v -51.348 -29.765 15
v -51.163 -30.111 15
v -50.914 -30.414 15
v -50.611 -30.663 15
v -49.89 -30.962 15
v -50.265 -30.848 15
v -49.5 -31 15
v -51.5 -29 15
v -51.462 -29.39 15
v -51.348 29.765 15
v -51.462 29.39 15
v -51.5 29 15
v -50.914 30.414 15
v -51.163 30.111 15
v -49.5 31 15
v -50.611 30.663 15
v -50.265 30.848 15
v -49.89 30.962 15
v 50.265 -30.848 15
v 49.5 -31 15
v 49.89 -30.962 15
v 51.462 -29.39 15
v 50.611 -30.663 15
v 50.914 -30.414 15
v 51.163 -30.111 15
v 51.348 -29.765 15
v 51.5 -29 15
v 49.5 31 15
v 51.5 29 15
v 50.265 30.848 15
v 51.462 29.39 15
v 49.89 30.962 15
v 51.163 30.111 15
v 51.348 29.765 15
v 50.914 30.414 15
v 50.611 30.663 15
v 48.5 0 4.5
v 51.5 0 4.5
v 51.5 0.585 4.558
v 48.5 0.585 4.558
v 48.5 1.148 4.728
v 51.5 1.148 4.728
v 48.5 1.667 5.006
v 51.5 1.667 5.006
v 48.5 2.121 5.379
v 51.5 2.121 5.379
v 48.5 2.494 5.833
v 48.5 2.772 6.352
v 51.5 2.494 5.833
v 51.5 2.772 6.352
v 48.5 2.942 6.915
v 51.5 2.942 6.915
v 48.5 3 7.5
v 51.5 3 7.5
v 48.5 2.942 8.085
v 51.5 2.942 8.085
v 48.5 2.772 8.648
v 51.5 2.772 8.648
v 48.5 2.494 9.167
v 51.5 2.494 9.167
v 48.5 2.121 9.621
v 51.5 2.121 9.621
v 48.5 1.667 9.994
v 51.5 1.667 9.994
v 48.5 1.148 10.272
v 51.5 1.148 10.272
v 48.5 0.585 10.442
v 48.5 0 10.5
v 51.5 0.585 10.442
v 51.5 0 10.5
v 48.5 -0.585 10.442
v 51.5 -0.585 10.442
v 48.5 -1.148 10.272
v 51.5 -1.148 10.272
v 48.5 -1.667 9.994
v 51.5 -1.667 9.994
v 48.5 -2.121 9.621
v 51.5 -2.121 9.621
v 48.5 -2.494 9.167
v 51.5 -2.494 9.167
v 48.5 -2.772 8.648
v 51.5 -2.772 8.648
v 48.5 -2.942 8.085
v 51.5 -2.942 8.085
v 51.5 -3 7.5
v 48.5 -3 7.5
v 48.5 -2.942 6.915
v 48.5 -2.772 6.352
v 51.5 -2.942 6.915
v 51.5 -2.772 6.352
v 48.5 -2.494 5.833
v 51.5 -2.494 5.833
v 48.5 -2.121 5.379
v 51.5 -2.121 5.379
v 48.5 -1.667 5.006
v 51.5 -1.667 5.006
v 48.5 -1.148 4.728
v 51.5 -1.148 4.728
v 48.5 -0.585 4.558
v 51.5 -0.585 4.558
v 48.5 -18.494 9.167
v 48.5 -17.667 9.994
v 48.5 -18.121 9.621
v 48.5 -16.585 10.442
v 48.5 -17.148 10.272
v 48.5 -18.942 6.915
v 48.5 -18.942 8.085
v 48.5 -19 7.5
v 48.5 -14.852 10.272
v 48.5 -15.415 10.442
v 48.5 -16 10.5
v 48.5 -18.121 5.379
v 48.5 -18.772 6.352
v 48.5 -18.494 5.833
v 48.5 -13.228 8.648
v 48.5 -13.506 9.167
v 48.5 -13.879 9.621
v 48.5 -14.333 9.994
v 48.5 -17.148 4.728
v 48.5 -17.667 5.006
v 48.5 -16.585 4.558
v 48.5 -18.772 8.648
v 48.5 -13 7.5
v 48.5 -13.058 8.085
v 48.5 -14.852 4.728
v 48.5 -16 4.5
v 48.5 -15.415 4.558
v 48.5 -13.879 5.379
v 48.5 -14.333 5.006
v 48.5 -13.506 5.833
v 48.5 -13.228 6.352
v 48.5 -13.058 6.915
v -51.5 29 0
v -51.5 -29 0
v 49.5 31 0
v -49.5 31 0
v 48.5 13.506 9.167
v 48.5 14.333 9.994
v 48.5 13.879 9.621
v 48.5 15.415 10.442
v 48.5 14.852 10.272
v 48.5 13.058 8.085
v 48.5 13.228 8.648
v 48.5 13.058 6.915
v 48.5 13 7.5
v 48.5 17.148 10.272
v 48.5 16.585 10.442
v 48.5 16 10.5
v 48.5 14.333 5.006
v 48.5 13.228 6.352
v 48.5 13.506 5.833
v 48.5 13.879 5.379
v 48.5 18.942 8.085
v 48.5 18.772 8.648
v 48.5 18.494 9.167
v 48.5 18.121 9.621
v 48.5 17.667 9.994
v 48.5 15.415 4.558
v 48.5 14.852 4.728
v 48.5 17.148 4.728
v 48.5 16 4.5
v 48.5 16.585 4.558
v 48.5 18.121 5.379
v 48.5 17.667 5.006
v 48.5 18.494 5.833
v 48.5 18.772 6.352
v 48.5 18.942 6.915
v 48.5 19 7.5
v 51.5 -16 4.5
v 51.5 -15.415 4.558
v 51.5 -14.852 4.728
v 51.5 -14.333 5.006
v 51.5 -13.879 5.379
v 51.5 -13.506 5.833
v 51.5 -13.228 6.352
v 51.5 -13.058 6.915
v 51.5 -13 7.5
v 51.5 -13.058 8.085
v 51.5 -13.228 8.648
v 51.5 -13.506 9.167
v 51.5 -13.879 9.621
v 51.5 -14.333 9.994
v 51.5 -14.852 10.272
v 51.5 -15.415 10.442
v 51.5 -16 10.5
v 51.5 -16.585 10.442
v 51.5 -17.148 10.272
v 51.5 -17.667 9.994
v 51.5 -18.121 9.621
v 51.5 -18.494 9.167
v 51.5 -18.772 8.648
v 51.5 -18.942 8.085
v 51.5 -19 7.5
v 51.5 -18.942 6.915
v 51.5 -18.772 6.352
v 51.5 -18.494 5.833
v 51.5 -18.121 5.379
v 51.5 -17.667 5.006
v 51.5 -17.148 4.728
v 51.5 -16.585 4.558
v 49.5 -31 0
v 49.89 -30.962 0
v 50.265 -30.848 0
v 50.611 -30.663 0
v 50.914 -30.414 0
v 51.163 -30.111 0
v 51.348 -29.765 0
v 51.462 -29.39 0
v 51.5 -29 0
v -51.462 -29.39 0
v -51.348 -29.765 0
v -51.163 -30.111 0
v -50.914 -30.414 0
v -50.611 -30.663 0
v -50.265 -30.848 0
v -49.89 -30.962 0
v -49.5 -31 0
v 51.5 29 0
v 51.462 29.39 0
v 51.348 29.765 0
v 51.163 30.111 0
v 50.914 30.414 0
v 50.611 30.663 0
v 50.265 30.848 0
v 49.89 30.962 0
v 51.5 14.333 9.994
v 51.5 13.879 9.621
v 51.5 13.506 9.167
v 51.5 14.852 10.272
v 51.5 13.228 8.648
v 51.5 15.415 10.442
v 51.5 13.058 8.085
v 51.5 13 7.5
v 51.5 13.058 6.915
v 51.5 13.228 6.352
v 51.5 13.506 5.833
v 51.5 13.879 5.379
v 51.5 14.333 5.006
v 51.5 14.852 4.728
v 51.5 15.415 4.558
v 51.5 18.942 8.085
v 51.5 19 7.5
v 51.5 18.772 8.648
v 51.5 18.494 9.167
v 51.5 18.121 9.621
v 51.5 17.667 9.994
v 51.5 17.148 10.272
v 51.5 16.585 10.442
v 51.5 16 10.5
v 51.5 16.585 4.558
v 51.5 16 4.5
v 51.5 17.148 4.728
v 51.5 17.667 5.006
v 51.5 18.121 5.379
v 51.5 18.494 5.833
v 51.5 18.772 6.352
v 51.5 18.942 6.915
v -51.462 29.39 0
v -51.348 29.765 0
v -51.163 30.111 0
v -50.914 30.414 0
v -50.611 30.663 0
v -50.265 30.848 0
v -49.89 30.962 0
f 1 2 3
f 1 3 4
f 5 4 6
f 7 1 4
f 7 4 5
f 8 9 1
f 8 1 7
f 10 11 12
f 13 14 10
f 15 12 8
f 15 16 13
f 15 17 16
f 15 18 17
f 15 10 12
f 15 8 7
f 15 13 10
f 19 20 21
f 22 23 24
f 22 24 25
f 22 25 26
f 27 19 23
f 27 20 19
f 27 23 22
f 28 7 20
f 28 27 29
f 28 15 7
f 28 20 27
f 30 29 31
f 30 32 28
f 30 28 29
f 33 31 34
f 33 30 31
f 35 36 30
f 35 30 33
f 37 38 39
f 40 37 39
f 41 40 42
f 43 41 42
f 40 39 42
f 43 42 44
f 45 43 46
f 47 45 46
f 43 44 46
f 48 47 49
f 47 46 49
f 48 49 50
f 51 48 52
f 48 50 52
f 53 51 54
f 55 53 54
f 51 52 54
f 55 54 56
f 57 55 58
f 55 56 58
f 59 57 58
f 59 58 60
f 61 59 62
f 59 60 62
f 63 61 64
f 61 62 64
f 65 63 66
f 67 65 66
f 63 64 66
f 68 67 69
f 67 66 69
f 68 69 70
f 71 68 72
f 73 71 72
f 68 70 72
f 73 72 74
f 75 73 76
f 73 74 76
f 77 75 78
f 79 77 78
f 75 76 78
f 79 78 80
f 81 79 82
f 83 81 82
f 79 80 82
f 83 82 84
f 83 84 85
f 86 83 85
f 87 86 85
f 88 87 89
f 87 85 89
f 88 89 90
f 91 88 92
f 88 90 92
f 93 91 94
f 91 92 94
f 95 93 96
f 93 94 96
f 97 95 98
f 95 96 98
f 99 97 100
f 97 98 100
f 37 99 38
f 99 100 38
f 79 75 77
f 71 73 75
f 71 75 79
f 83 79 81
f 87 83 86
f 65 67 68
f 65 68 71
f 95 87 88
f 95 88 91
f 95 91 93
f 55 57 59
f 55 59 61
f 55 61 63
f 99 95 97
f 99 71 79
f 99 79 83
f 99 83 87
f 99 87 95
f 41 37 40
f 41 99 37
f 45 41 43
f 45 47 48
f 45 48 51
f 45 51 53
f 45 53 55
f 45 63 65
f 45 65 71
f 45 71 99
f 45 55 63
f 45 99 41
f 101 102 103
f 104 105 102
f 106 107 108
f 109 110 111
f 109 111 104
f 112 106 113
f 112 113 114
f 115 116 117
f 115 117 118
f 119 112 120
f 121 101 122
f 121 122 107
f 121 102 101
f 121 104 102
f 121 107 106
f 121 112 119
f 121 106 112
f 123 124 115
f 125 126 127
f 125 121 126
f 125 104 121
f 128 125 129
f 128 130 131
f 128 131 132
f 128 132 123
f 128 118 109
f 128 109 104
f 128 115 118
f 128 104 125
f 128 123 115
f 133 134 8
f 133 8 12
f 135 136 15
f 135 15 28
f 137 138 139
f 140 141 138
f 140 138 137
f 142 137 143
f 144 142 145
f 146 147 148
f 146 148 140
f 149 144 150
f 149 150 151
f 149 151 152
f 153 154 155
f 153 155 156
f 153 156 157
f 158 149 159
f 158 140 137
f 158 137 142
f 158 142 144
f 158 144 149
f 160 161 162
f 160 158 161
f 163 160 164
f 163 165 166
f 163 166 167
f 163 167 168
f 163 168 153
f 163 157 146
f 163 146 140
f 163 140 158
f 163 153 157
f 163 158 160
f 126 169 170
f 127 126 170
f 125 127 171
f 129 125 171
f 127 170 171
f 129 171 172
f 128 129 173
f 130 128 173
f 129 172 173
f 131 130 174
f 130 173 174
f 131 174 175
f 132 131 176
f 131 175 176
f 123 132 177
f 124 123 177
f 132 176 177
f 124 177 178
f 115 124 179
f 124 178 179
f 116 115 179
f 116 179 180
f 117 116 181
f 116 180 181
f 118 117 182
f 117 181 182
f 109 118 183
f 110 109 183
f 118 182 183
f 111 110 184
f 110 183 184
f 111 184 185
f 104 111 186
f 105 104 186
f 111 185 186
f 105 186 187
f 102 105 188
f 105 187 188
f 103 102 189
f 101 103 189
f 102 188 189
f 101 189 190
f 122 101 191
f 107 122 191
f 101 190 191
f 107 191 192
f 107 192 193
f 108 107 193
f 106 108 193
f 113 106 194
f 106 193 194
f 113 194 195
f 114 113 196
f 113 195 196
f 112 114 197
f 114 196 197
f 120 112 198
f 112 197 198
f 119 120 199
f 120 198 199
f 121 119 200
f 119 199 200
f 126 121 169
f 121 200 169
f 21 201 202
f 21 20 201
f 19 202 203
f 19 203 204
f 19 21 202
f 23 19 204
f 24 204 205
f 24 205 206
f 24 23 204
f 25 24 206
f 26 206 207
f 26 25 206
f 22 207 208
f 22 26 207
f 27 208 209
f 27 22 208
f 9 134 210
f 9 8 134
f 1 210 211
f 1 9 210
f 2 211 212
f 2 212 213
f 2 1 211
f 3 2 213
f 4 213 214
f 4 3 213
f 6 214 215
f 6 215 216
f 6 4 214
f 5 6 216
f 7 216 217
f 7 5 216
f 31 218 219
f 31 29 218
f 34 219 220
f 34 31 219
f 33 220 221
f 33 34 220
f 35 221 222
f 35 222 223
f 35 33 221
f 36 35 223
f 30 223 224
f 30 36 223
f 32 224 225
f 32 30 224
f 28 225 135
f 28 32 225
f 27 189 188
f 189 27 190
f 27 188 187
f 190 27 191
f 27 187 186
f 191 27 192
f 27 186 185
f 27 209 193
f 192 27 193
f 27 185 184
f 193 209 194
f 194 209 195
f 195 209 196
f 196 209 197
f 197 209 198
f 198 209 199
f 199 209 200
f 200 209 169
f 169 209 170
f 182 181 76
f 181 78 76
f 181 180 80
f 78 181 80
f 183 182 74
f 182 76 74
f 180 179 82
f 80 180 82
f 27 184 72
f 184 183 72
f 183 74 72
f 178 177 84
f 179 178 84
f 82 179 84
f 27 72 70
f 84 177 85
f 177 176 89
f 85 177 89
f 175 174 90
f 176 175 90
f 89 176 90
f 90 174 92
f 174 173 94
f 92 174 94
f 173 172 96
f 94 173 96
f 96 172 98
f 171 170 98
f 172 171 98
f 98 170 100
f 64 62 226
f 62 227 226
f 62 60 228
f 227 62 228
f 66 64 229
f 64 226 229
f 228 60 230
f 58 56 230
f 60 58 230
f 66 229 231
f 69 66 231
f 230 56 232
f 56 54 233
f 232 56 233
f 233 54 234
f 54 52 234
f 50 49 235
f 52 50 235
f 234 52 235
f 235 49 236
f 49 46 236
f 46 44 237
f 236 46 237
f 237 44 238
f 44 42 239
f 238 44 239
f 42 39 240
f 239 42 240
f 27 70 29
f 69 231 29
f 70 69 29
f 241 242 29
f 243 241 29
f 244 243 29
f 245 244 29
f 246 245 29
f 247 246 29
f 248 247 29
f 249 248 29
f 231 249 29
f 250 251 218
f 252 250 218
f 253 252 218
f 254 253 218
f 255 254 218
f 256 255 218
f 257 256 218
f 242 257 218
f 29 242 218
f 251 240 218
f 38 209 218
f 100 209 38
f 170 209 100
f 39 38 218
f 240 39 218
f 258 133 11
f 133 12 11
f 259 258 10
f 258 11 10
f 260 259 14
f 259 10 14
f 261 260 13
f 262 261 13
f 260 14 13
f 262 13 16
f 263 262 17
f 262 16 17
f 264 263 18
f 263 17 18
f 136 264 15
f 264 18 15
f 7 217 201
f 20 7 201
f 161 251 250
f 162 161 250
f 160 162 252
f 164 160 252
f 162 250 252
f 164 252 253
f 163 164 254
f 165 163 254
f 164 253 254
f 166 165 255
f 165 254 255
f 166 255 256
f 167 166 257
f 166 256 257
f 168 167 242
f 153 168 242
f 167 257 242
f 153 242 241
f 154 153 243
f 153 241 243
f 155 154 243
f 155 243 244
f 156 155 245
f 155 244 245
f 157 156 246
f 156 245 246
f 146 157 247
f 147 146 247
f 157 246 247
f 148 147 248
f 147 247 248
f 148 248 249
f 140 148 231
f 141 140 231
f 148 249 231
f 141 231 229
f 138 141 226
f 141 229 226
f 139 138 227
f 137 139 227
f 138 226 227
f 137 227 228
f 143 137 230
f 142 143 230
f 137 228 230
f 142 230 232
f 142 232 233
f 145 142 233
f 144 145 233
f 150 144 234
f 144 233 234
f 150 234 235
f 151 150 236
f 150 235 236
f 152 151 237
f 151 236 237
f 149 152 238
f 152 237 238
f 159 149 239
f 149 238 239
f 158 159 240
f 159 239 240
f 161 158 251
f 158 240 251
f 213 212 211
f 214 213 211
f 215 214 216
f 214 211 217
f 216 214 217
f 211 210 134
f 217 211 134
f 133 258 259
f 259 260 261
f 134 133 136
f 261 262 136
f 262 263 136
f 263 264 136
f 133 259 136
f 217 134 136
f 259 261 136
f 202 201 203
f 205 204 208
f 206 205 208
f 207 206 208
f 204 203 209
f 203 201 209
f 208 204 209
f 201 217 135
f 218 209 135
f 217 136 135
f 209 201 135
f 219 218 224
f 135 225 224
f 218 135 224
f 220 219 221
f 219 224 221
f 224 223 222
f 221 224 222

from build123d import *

# Parameters (mm, degrees)
SKETCH_1_W          = 103
SKETCH_1_H          = 62
EXTRUDE_1_DEPTH     = 15
FILLET_1_R          = 2
SKETCH_2_R          = 3
CUT_EXTRUDE_1_DEPTH = 3


with BuildPart() as part:
    # 草图1 → 凸台-拉伸1 (new body)
    with BuildSketch(Plane.XY):
        Rectangle(SKETCH_1_W, SKETCH_1_H)
    extrude(amount=EXTRUDE_1_DEPTH)

    # 圆角1
    fillet_1_edges = [part.edges().sort_by_distance(p)[0] for p in [
        (51.5, -31, 7.5),
        (-51.5, -31, 7.5),
        (-51.5, 31, 7.5),
        (51.5, 31, 7.5),
    ]]
    fillet(fillet_1_edges, radius=FILLET_1_R)

    # 草图2 → 切除-拉伸1 (cut)
    with BuildSketch(Plane(origin=(51.5, 0, 0), x_dir=(0, 0, -1), z_dir=(1, 0, 0))):
        with Locations((-7.5, 0)):
            Circle(SKETCH_2_R)
        with Locations((-7.5, 16)):
            Circle(SKETCH_2_R)
        with Locations((-7.5, -16)):
            Circle(SKETCH_2_R)
    extrude(amount=-CUT_EXTRUDE_1_DEPTH, mode=Mode.SUBTRACT)


solid = part.part
